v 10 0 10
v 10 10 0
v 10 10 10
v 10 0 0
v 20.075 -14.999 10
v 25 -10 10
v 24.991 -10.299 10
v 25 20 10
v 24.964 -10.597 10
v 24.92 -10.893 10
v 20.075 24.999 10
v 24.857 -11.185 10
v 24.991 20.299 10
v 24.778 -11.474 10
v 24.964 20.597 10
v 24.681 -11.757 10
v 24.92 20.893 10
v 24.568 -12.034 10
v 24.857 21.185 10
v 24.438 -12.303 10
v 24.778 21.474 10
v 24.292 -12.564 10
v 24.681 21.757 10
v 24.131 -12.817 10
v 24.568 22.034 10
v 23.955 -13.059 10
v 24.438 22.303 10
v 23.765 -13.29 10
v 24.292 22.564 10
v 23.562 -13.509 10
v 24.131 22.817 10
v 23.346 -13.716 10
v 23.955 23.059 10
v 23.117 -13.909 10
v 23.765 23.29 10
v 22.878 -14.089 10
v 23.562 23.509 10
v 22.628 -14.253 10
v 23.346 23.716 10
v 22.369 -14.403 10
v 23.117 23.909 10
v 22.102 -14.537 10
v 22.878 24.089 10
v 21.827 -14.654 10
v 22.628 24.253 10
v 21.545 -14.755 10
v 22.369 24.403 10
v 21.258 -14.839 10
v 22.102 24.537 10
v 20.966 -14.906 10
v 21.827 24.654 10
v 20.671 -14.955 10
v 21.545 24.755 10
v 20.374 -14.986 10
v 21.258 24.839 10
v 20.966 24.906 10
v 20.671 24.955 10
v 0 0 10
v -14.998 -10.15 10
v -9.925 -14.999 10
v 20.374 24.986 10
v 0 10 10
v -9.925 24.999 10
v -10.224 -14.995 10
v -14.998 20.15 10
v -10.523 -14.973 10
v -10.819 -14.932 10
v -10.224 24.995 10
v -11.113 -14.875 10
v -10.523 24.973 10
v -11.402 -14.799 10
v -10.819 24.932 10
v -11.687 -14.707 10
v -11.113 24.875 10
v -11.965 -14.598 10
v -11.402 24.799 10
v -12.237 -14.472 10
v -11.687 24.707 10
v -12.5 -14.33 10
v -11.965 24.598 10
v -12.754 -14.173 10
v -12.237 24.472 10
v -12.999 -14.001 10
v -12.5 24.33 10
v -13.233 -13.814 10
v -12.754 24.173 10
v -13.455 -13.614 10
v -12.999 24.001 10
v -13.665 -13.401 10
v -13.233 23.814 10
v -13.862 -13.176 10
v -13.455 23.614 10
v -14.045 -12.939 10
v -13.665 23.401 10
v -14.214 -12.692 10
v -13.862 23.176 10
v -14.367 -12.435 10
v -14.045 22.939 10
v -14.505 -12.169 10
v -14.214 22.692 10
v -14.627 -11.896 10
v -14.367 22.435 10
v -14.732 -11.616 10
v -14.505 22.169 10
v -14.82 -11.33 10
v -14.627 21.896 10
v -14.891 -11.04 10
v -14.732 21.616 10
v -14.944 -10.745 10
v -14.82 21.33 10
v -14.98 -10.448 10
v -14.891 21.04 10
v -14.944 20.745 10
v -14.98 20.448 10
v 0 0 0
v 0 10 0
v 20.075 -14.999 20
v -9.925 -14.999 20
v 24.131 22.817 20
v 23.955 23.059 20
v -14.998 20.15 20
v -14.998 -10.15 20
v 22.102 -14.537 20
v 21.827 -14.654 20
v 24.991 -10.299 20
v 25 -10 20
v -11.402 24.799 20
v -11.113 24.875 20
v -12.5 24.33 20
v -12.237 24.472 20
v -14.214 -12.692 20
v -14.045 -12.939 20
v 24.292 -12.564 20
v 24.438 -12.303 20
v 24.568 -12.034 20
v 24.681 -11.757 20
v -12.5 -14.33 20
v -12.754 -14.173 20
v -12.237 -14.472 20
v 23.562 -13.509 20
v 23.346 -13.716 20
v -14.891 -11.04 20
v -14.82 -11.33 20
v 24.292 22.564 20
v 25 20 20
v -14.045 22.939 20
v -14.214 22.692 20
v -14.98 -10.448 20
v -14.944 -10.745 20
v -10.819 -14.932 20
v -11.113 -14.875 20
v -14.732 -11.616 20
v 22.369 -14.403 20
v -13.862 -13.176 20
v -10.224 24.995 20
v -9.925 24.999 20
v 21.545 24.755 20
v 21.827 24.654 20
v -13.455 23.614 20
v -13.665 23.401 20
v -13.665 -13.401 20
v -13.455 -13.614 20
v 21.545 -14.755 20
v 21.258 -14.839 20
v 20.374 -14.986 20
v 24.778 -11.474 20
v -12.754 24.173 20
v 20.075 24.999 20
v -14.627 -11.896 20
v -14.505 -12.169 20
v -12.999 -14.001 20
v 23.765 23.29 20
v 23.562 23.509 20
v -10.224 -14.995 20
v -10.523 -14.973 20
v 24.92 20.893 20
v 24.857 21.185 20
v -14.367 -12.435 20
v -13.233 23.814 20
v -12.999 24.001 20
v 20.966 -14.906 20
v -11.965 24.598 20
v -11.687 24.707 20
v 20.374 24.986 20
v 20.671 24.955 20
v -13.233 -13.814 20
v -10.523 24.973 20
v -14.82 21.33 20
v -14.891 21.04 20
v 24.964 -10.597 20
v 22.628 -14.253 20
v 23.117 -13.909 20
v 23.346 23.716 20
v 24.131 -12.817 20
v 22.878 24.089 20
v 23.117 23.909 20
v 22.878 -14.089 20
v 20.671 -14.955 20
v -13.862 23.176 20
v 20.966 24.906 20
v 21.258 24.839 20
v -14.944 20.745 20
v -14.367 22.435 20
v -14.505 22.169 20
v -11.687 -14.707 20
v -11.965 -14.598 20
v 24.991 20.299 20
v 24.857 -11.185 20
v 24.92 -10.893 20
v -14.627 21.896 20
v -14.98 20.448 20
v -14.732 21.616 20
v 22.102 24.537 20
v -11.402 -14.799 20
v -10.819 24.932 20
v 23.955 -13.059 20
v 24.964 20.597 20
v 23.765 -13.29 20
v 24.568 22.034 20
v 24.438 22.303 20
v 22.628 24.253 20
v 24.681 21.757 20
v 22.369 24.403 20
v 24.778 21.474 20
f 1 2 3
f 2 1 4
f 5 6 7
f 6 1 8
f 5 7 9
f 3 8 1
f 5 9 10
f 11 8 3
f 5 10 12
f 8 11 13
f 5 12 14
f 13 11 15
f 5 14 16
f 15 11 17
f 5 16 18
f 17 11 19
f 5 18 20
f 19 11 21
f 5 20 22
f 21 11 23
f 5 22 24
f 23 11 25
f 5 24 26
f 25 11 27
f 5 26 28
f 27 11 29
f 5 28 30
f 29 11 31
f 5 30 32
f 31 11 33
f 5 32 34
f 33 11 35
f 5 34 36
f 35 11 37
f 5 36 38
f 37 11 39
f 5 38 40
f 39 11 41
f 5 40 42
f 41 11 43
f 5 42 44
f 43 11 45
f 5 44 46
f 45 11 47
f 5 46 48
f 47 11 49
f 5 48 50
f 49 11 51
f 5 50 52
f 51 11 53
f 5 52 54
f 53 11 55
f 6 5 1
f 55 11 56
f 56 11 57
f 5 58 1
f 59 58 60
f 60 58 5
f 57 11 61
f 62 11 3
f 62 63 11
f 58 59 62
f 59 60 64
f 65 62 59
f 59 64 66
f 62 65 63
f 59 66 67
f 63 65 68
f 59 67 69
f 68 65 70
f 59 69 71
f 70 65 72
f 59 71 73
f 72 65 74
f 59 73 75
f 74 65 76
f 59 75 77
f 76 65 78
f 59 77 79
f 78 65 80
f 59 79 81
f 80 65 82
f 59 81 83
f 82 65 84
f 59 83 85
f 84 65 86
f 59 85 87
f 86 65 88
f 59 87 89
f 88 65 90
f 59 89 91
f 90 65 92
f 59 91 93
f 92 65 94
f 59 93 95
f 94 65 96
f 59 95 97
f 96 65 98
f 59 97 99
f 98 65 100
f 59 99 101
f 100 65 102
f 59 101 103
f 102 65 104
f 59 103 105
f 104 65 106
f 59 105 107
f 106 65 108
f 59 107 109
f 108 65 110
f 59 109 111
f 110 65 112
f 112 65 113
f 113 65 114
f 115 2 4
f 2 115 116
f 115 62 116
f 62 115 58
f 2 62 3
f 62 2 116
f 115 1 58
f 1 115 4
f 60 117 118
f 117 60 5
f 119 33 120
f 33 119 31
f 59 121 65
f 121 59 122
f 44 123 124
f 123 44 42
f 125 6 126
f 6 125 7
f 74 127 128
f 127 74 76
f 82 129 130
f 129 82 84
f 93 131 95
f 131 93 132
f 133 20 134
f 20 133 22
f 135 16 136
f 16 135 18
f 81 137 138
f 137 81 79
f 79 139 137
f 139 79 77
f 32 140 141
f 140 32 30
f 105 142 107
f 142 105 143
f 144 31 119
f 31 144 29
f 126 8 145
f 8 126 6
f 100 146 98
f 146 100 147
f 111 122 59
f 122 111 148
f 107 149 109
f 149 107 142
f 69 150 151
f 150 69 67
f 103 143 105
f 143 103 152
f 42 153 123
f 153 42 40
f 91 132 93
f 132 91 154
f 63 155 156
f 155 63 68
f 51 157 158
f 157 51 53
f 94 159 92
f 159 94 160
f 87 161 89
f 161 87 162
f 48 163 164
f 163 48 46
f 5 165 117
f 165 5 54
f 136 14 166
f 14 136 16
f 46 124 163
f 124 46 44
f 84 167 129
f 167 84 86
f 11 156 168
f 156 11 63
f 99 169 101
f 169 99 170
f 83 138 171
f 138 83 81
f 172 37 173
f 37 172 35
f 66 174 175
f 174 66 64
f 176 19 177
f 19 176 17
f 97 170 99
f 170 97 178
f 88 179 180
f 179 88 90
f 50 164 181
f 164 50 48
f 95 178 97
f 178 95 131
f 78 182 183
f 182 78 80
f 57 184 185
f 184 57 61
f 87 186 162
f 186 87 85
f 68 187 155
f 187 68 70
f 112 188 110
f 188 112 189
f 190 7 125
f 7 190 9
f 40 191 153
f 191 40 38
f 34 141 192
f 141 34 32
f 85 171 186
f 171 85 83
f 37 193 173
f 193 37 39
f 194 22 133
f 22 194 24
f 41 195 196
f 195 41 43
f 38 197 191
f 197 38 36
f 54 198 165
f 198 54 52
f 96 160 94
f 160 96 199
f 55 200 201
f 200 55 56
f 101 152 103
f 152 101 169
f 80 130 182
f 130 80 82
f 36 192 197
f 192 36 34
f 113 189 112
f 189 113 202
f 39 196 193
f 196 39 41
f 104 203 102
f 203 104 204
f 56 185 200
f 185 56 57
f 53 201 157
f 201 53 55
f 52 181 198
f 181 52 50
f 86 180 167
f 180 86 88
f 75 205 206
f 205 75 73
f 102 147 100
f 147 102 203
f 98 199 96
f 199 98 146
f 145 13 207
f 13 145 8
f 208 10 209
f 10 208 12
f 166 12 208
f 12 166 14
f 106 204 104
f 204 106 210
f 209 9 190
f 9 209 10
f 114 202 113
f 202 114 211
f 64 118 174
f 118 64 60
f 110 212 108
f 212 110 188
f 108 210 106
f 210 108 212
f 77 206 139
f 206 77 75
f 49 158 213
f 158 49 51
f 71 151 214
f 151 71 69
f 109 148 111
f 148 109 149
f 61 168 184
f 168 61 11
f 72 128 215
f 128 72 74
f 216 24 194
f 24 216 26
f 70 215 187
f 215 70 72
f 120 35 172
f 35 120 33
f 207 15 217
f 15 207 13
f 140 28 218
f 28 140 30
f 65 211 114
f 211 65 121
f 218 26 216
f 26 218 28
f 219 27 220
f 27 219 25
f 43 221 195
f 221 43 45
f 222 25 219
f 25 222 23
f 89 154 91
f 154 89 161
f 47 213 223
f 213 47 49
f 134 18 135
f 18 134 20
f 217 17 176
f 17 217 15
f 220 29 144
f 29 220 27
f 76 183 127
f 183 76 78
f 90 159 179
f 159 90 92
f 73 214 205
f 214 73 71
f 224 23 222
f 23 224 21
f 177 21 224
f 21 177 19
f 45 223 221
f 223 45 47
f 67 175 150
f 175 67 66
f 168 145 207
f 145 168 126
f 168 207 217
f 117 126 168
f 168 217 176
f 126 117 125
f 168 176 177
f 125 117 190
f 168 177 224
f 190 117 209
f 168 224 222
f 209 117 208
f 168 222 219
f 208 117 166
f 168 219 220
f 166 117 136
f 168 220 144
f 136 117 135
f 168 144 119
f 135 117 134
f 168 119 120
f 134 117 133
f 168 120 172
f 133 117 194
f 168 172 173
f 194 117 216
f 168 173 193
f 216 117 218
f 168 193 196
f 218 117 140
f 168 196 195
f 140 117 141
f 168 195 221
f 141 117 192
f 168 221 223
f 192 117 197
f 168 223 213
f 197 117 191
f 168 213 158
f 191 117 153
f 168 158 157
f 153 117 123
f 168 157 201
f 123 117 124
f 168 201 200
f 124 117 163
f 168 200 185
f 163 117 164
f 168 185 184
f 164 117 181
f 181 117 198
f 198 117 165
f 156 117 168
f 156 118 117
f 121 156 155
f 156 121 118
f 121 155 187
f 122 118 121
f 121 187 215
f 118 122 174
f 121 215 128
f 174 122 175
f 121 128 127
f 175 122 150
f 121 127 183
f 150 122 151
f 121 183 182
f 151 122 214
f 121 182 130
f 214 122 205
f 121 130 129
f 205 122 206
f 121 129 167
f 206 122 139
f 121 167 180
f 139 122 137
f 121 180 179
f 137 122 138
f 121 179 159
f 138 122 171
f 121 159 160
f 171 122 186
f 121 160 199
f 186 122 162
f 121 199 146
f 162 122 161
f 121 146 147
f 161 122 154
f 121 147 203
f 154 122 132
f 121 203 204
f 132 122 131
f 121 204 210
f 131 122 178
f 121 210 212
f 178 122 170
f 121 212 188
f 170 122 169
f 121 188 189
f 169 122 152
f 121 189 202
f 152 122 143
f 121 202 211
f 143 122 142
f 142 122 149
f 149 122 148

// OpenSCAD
$fs = 0.3;
$fa = 1;

cube(10);
translate([-10, -10, 10]) {
	minkowski() {
		cube([30, 30, 9]);
		cylinder(r=5, h=1);
	}
}
